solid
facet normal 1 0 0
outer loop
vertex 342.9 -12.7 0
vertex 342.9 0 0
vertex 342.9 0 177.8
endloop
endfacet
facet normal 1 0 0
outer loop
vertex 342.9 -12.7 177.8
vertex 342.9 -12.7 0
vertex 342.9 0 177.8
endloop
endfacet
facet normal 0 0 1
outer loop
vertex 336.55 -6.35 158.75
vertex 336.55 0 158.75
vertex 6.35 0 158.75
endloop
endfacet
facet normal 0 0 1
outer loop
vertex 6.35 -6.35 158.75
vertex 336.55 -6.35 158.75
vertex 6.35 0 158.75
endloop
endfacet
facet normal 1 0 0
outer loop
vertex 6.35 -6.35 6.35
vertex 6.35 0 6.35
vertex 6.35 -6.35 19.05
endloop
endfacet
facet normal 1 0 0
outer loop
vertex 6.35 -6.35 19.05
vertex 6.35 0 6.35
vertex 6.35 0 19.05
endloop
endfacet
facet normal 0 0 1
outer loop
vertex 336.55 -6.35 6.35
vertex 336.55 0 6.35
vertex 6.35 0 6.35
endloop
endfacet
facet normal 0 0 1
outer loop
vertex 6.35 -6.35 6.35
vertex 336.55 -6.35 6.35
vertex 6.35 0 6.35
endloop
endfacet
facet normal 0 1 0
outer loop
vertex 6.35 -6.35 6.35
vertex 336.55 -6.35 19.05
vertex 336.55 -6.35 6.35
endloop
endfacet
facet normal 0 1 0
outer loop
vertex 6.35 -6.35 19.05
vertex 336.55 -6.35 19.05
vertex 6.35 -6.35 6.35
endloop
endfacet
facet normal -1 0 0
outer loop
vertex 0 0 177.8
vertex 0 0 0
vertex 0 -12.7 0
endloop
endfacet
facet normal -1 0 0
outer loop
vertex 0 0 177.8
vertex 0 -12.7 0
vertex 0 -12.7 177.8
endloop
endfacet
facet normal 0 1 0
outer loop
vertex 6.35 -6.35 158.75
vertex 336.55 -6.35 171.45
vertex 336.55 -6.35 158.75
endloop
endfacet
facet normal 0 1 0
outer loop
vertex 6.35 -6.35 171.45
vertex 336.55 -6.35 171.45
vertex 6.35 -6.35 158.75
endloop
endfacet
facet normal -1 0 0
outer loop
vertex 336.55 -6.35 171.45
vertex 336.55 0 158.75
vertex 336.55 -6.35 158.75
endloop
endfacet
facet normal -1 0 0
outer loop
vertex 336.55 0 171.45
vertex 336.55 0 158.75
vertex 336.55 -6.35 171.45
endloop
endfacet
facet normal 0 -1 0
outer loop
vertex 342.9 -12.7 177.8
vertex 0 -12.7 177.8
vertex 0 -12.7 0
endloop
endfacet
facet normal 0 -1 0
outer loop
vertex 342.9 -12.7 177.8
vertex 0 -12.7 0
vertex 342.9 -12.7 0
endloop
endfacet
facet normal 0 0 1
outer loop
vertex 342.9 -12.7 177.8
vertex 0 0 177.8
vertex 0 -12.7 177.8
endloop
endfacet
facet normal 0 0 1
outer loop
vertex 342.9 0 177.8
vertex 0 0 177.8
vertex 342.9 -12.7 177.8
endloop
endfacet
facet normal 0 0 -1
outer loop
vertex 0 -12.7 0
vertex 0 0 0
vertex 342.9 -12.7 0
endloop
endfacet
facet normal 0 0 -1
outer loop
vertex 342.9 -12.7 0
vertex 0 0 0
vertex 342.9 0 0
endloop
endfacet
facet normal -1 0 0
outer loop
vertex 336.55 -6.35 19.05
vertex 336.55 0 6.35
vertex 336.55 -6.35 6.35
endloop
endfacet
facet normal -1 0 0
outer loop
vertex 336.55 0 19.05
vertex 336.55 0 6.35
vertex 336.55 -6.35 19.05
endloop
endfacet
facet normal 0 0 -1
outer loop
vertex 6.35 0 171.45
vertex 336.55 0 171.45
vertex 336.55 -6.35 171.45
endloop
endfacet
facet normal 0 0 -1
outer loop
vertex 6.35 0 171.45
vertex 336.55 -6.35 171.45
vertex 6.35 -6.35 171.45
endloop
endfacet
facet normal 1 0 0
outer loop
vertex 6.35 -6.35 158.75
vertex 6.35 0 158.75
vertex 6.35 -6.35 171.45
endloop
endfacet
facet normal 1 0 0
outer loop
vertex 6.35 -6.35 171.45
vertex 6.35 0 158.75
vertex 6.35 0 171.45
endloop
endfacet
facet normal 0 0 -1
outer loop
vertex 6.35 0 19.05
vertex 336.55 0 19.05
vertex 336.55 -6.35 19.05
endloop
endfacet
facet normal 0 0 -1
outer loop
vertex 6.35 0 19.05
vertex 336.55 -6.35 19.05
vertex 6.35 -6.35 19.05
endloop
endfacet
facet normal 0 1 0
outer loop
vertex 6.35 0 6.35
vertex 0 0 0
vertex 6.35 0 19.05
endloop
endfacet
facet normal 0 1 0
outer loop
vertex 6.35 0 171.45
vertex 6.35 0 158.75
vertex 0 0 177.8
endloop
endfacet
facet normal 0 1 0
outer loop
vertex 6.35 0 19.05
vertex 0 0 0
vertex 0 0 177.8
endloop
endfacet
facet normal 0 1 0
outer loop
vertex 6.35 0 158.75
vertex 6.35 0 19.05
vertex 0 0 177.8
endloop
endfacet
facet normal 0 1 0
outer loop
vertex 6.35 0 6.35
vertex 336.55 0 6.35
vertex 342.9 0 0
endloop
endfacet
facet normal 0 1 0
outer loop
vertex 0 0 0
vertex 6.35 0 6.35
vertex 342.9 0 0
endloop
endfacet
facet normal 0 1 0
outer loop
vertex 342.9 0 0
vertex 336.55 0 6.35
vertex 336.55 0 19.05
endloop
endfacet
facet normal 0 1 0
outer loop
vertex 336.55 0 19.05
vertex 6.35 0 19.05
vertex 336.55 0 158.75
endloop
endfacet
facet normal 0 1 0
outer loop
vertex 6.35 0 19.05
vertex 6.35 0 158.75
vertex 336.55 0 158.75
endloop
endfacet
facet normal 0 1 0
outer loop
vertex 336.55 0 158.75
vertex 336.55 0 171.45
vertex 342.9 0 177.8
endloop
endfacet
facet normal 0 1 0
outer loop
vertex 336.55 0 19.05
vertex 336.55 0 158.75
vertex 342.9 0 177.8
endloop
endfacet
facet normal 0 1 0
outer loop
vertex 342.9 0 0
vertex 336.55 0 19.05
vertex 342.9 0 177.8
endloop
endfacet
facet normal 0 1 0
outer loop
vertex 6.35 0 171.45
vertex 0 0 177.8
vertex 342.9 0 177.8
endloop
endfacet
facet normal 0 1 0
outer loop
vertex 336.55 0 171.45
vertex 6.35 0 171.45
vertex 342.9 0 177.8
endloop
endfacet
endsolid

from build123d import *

# Parameters (mm, degrees)
F0_W     = 342.9
F0_H     = 177.8
F1_DEPTH = 12.7
F2_W     = 330.2
F2_H     = 12.7
F3_DEPTH = 6.35
F4_W     = 330.2
F4_H     = 12.7
F5_DEPTH = 6.35


with BuildPart() as f1:
    # F0 (on Front) → F1 (new body)
    with BuildSketch(Plane.XZ):
        with Locations((171.45, 88.9)):
            Rectangle(F0_W, F0_H)
    extrude(amount=F1_DEPTH)

    # F2 (on face) → F3 (cut)
    with BuildSketch(Plane(origin=(0, 0, 0), x_dir=(-1, 0, 0), z_dir=(0, 1, 0))):
        with Locations((-171.45, 12.7)):
            Rectangle(F2_W, F2_H)
    extrude(amount=-F3_DEPTH, mode=Mode.SUBTRACT)

    # F4 (on face) → F5 (cut)
    with BuildSketch(Plane(origin=(0, 0, 0), x_dir=(-1, 0, 0), z_dir=(0, 1, 0))):
        with Locations((-171.45, 165.1)):
            Rectangle(F4_W, F4_H)
    extrude(amount=-F5_DEPTH, mode=Mode.SUBTRACT)


solid = f1.part
